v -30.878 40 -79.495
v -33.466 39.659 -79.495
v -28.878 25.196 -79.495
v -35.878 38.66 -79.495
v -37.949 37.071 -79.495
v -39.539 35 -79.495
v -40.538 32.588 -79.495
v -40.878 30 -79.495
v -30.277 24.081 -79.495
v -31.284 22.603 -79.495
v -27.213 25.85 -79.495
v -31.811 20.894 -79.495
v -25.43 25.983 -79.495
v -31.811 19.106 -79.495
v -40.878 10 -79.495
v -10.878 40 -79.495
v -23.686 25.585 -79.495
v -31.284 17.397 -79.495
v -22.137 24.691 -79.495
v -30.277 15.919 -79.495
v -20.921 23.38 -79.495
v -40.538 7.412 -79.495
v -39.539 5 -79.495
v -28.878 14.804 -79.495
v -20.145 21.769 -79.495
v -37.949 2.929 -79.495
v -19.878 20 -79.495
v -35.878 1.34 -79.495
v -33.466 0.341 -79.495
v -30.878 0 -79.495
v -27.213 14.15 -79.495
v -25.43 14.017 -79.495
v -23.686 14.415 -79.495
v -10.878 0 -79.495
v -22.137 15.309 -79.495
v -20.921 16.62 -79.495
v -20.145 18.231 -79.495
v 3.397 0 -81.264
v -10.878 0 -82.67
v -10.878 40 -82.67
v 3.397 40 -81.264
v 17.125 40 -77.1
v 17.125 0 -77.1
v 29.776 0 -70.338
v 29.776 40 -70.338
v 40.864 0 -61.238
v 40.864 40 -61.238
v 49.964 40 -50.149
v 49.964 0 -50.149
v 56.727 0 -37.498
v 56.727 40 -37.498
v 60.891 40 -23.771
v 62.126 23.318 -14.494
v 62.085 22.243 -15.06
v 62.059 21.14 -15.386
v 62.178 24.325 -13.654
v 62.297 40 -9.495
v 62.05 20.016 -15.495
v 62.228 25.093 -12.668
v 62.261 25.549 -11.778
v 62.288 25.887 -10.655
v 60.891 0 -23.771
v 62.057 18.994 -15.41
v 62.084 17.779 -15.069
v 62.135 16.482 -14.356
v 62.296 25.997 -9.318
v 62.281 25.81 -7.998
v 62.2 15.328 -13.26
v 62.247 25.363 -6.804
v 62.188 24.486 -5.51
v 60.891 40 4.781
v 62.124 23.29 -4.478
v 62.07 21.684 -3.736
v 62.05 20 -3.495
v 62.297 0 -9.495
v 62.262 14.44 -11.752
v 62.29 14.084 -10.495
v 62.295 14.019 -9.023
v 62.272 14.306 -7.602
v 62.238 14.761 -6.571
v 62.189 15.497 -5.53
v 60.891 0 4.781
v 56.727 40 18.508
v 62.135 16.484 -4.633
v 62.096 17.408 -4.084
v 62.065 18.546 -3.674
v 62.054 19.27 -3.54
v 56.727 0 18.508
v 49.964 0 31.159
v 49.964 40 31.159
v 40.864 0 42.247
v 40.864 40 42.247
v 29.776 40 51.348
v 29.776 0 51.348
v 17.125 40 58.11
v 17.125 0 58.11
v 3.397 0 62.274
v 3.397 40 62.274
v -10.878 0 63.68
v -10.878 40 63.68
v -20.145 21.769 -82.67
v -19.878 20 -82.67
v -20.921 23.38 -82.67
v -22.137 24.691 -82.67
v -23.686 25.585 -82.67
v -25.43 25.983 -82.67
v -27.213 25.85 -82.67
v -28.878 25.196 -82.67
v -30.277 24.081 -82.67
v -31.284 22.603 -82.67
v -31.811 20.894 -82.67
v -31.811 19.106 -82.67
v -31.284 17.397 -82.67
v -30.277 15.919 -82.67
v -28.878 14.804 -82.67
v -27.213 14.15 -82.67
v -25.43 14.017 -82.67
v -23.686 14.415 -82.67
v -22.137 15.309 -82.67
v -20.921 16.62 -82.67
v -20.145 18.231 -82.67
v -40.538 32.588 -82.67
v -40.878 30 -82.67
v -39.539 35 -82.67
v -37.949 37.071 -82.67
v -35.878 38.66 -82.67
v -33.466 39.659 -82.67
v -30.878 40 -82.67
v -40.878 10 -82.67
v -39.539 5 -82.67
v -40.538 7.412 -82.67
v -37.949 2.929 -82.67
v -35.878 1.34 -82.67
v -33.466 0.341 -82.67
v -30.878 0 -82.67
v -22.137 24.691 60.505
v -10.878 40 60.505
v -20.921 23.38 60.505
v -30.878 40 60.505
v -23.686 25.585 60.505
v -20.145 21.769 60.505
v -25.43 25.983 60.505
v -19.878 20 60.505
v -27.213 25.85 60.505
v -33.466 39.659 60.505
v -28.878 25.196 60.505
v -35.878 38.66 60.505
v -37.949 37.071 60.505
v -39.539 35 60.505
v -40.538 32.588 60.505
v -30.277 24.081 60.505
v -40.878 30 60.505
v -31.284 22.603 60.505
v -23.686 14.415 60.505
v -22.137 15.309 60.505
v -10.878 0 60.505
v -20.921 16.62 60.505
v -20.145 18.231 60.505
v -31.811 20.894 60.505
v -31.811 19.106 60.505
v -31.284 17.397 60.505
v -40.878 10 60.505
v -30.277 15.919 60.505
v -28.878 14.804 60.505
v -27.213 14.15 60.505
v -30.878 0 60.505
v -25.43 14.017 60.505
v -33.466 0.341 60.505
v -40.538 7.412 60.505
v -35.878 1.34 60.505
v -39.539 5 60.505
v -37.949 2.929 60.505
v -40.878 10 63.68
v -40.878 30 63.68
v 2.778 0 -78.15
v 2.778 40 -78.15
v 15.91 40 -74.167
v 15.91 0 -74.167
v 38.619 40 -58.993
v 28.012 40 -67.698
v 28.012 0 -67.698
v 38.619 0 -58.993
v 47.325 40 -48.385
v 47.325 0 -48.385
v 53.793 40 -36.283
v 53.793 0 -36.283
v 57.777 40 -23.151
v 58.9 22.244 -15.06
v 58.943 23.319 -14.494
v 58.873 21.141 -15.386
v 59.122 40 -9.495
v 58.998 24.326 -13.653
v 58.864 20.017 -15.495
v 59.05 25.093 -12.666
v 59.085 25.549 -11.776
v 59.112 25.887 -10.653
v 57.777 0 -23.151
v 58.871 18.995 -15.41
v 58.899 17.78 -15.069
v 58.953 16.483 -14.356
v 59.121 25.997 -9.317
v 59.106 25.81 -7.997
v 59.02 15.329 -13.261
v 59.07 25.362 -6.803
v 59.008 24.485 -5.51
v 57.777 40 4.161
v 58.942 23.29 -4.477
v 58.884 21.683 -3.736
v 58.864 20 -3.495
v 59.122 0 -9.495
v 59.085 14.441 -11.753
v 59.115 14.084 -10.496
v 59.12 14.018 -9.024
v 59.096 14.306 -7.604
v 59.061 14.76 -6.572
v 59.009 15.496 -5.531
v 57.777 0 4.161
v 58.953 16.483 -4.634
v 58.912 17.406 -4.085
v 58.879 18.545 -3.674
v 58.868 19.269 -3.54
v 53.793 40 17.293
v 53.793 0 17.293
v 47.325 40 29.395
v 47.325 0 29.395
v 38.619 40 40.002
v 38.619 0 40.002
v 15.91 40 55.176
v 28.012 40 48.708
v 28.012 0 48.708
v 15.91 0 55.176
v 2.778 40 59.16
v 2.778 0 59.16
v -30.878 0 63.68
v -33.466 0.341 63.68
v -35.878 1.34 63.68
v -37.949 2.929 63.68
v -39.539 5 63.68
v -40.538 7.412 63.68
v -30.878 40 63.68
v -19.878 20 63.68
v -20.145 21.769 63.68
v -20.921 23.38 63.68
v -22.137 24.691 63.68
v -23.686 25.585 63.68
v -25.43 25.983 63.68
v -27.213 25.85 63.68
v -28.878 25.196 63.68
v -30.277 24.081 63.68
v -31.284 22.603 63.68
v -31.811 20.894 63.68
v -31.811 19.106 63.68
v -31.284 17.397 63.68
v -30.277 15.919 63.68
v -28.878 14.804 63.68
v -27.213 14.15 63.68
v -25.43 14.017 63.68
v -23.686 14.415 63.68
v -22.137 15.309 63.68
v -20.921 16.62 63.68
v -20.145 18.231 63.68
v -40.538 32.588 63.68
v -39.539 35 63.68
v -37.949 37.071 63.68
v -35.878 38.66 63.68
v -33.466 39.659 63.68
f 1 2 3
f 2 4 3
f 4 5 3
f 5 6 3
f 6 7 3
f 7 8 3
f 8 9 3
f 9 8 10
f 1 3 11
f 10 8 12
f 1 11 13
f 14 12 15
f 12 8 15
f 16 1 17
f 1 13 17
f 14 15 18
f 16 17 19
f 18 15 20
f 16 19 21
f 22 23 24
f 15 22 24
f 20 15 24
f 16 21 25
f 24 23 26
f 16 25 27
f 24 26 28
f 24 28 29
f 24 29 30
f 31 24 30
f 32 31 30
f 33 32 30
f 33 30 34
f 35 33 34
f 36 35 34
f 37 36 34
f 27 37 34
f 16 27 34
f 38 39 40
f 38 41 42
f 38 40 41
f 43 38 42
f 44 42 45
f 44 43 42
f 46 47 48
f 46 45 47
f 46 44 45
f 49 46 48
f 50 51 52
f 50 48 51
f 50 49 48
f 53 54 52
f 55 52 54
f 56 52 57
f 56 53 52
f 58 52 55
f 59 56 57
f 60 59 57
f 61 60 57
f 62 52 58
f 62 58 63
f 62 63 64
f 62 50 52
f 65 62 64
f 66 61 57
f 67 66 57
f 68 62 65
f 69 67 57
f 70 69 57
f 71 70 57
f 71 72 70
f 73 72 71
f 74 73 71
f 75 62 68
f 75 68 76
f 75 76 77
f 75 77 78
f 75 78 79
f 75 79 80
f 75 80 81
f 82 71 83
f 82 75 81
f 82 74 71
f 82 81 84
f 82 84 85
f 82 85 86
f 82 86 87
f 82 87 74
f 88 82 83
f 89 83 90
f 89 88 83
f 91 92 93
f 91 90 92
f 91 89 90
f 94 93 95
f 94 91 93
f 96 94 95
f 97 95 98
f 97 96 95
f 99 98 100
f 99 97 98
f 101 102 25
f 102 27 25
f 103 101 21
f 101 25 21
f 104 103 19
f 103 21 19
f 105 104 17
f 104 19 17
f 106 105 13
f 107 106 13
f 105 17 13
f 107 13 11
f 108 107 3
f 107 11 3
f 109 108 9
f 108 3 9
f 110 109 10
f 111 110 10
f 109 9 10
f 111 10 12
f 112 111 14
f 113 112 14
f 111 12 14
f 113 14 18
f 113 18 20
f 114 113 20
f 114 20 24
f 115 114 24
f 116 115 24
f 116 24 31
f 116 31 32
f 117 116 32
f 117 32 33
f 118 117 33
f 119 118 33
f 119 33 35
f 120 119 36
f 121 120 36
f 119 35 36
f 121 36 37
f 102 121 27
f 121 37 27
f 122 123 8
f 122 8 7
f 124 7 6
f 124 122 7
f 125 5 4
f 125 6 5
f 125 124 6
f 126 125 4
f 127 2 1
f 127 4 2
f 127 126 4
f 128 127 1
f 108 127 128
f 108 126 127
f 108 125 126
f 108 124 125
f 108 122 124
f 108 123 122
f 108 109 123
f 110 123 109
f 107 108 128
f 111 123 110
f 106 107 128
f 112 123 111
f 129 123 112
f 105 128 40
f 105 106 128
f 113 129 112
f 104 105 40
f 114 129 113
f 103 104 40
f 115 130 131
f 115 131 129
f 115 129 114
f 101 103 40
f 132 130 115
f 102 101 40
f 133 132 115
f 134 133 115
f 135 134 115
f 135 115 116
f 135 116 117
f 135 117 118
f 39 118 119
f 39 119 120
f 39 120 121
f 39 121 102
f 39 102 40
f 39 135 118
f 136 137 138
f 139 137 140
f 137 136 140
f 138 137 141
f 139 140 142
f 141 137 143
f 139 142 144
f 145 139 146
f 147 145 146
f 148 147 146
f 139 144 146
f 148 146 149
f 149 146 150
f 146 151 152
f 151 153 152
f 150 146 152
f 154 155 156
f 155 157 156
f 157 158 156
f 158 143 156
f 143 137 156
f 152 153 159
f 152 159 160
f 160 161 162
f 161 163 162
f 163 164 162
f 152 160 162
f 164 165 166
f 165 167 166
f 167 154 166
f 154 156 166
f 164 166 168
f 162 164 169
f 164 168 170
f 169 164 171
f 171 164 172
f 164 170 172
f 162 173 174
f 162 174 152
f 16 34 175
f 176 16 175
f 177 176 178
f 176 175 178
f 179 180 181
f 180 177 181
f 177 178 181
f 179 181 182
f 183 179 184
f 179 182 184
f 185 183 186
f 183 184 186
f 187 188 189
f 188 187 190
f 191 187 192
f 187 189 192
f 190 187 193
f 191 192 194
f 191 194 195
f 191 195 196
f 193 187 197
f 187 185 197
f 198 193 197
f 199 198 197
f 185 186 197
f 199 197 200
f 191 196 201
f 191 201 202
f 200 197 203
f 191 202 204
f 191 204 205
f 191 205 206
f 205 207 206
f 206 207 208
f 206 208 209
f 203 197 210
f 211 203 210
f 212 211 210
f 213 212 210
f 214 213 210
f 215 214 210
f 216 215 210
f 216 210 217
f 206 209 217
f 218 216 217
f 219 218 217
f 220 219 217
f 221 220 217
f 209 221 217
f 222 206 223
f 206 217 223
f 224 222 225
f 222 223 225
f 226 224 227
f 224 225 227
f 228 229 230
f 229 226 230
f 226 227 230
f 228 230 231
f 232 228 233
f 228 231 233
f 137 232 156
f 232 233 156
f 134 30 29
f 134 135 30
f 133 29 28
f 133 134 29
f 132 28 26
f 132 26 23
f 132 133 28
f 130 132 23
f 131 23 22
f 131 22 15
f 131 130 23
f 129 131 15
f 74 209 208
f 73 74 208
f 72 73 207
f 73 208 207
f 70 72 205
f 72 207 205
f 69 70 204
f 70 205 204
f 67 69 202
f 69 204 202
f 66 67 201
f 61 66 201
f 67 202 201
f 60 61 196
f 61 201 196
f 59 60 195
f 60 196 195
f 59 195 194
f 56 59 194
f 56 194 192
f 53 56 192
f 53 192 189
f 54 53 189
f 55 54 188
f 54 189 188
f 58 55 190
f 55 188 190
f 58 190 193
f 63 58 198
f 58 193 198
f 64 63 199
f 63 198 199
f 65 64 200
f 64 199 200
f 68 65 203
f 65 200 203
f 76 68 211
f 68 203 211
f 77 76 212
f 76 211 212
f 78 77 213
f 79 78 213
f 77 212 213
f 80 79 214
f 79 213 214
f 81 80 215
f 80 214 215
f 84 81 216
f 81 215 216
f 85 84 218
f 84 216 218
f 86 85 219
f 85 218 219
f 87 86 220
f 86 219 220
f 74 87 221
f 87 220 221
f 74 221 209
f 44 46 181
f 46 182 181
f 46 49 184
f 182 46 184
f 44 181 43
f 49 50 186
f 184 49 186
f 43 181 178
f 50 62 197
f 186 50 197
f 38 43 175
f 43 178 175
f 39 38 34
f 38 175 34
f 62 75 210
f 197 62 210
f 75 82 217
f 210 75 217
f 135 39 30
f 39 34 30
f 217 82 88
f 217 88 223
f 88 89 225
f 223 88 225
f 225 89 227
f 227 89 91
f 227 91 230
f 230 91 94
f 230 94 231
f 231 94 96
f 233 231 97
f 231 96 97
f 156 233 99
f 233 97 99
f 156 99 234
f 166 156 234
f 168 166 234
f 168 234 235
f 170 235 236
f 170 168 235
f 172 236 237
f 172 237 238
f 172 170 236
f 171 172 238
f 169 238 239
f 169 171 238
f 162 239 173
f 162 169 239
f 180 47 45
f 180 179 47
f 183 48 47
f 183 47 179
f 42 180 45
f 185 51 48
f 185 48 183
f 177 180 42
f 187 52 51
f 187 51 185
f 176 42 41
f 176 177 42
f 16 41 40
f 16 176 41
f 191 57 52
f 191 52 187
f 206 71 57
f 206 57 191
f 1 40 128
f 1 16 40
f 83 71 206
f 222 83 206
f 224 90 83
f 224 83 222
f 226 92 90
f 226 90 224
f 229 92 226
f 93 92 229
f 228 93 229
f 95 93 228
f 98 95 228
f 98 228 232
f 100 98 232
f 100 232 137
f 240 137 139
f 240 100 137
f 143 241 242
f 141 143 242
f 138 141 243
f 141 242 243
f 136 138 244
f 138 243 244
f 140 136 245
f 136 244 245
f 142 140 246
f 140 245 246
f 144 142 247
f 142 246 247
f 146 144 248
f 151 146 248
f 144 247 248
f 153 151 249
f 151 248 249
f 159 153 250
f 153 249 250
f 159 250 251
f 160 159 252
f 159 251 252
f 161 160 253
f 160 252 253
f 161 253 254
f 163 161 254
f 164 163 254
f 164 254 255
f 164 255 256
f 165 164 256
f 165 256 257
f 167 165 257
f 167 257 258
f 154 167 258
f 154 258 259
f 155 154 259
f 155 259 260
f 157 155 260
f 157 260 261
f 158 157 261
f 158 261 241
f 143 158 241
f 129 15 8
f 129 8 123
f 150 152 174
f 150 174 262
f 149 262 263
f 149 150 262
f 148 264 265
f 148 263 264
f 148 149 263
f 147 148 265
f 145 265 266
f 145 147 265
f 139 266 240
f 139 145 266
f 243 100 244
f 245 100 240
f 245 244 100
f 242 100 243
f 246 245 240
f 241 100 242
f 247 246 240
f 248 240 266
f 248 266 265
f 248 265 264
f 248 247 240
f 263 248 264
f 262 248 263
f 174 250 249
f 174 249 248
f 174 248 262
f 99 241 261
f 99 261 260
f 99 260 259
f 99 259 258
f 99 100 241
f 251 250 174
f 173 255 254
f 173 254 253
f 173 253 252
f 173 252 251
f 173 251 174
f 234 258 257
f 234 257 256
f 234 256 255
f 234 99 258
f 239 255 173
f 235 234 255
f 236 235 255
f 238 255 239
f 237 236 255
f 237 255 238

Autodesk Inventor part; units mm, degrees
ref_plane "YZ Plane" through (0, 0, 0) normal (1, 0, 0) x (0, 1, 0)
ref_plane "XZ Plane" through (0, 0, 0) normal (0, 1, 0) x (-1, 0, 0)
ref_plane "XY Plane" through (0, 0, 0) normal (0, 0, 1) x (1, 0, 0)
sketch "Sketch1" plane through (0, 0, 0) normal (0, 1, 0) x (-1, 0, 0)
  arc A0 (10.8783, 63.6799) -> (10.8783, -82.6701) centre (10.8783, -9.4951) ccw
  line L0 (10.8783, 63.6799) -> (40.8783, 63.6799)
  line L1 (40.8783, -82.6701) -> (10.8783, -82.6701)
  line L2 (40.8783, -79.4951) -> (10.8783, -79.4951)
  arc A1 (10.8783, 60.5049) -> (10.8783, -79.4951) centre (10.8783, -9.4951) ccw
  line L3 (10.8783, 60.5049) -> (40.8783, 60.5049)
  line L4 (40.8783, 63.6799) -> (40.8783, 60.5049)
  line L5 (40.8783, -79.4951) -> (40.8783, -82.6701)
  line L6 (25.8783, -82.6701) -> (25.8783, -9.4951)
  line L7 (25.8783, -9.4951) -> (10.8783, -9.4951)
  dimension "d1" = 30
  dimension "d2" = 3.175
  dimension "d15" = 70
extrude "Extrusion1" add sketch "Sketch1" along normal blind 40
sketch "Sketch2" plane through (-40.8783, 0, 63.6799) normal (0, 0, 1) x (1, 0, 0)
  line L0 (29.9701, 0) -> (0, 40)
  line L1 (0, 40) -> (30, 40)
  line L2 (0, 40) -> (30, 40) projected
  line L3 (30, 40) -> (0, 0)
  circle A0 centre (15, 20) radius 6
  point P0 (40.8783, 0)
  dimension "d5" = 12
extrude "Extrusion2" cut sketch "Sketch2" against normal blind 200 contours A0 L3 L0 | L0 L3 A0 | L3 A0 L0 | L0 A0 L3
fillet "Fillet1" radius 10 2 edges at (-40.8783, 40, 62.0924) (-40.8783, 0, 62.0924)
fillet "Fillet2" radius 10 2 edges at (-40.8783, 40, -81.0826) (-40.8783, 0, -81.0826)
sketch "Sketch3" plane through (-40.8783, 10, -79.4951) normal (-1, 0, 0) x (0, 0, 1)
  line L0 (-3.175, 0) -> (143.175, 20)
  line L1 (143.175, -10) -> (143.175, 30) projected
  line L2 (143.175, 0) -> (-3.175, 20)
  circle A0 centre (70, 10) radius 6
  point P0 (79.4951, -10)
  dimension "d10" = 12
extrude "Extrusion3" cut sketch "Sketch3" against normal blind 200 contours A0 L2 L0 | L0 L2 A0 | L2 A0 L0 | L0 A0 L2
properties part number "APOIO_TUBO"
